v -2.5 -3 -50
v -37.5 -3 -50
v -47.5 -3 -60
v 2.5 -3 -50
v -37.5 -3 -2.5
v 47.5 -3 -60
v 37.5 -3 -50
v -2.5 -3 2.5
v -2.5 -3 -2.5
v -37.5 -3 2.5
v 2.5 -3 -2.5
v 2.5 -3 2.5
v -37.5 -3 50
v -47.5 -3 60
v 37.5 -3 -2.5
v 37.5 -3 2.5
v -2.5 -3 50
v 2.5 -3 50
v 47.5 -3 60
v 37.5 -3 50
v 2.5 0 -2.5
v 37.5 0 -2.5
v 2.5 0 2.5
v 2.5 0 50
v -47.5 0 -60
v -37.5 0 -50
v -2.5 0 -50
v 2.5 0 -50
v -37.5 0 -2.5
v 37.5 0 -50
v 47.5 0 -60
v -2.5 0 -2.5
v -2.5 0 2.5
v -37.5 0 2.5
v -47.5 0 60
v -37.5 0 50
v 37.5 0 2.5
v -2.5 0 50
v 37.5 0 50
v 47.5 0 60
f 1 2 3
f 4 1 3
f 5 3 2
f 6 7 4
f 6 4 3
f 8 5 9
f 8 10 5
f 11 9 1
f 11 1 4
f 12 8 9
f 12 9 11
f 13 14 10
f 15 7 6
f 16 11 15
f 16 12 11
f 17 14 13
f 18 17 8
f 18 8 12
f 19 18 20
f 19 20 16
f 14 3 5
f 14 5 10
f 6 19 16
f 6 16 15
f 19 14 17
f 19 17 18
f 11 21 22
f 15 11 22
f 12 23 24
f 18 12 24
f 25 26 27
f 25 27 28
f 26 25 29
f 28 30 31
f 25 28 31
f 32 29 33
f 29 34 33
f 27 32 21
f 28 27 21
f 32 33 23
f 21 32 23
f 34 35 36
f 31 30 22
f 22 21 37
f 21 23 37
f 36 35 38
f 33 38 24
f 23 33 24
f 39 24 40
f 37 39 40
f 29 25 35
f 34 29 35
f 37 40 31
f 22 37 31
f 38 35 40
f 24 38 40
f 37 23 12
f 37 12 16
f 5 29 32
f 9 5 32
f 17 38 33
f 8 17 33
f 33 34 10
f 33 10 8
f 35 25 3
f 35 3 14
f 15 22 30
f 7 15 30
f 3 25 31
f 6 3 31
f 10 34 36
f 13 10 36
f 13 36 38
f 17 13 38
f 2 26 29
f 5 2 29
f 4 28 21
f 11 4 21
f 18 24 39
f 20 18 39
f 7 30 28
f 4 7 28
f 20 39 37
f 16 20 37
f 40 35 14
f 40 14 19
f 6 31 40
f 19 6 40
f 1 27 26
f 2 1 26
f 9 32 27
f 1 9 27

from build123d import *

# Parameters (mm, degrees)
F0_W     = 95
F0_H     = 120
F0_W_2   = 5
F0_H_2   = 47.5
F0_W_3   = 35
F0_H_3   = 5
F1_DEPTH = 3


with BuildPart() as f1:
    # F0 (on Front) → F1 (new body)
    with BuildSketch(Plane.XZ):
        Rectangle(F0_W, F0_H)
        Polygon((37.5, -2.5), (37.5, -50), (2.5, -50), (-2.5, -50), (-37.5, -50), (-37.5, -2.5), (-37.5, 2.5), (-37.5, 50), (-2.5, 50), (2.5, 50), (37.5, 50), (37.5, 2.5), align=None, mode=Mode.SUBTRACT)
        with Locations((0, 26.25)):
            Rectangle(F0_W_2, F0_H_2)
        with Locations((0, -26.25)):
            Rectangle(F0_W_2, F0_H_2)
        with Locations((20, 0)):
            Rectangle(F0_W_3, F0_H_3)
        Rectangle(F0_W_2, F0_H_3)
        with Locations((-20, 0)):
            Rectangle(F0_W_3, F0_H_3)
    extrude(amount=F1_DEPTH)


solid = f1.part
